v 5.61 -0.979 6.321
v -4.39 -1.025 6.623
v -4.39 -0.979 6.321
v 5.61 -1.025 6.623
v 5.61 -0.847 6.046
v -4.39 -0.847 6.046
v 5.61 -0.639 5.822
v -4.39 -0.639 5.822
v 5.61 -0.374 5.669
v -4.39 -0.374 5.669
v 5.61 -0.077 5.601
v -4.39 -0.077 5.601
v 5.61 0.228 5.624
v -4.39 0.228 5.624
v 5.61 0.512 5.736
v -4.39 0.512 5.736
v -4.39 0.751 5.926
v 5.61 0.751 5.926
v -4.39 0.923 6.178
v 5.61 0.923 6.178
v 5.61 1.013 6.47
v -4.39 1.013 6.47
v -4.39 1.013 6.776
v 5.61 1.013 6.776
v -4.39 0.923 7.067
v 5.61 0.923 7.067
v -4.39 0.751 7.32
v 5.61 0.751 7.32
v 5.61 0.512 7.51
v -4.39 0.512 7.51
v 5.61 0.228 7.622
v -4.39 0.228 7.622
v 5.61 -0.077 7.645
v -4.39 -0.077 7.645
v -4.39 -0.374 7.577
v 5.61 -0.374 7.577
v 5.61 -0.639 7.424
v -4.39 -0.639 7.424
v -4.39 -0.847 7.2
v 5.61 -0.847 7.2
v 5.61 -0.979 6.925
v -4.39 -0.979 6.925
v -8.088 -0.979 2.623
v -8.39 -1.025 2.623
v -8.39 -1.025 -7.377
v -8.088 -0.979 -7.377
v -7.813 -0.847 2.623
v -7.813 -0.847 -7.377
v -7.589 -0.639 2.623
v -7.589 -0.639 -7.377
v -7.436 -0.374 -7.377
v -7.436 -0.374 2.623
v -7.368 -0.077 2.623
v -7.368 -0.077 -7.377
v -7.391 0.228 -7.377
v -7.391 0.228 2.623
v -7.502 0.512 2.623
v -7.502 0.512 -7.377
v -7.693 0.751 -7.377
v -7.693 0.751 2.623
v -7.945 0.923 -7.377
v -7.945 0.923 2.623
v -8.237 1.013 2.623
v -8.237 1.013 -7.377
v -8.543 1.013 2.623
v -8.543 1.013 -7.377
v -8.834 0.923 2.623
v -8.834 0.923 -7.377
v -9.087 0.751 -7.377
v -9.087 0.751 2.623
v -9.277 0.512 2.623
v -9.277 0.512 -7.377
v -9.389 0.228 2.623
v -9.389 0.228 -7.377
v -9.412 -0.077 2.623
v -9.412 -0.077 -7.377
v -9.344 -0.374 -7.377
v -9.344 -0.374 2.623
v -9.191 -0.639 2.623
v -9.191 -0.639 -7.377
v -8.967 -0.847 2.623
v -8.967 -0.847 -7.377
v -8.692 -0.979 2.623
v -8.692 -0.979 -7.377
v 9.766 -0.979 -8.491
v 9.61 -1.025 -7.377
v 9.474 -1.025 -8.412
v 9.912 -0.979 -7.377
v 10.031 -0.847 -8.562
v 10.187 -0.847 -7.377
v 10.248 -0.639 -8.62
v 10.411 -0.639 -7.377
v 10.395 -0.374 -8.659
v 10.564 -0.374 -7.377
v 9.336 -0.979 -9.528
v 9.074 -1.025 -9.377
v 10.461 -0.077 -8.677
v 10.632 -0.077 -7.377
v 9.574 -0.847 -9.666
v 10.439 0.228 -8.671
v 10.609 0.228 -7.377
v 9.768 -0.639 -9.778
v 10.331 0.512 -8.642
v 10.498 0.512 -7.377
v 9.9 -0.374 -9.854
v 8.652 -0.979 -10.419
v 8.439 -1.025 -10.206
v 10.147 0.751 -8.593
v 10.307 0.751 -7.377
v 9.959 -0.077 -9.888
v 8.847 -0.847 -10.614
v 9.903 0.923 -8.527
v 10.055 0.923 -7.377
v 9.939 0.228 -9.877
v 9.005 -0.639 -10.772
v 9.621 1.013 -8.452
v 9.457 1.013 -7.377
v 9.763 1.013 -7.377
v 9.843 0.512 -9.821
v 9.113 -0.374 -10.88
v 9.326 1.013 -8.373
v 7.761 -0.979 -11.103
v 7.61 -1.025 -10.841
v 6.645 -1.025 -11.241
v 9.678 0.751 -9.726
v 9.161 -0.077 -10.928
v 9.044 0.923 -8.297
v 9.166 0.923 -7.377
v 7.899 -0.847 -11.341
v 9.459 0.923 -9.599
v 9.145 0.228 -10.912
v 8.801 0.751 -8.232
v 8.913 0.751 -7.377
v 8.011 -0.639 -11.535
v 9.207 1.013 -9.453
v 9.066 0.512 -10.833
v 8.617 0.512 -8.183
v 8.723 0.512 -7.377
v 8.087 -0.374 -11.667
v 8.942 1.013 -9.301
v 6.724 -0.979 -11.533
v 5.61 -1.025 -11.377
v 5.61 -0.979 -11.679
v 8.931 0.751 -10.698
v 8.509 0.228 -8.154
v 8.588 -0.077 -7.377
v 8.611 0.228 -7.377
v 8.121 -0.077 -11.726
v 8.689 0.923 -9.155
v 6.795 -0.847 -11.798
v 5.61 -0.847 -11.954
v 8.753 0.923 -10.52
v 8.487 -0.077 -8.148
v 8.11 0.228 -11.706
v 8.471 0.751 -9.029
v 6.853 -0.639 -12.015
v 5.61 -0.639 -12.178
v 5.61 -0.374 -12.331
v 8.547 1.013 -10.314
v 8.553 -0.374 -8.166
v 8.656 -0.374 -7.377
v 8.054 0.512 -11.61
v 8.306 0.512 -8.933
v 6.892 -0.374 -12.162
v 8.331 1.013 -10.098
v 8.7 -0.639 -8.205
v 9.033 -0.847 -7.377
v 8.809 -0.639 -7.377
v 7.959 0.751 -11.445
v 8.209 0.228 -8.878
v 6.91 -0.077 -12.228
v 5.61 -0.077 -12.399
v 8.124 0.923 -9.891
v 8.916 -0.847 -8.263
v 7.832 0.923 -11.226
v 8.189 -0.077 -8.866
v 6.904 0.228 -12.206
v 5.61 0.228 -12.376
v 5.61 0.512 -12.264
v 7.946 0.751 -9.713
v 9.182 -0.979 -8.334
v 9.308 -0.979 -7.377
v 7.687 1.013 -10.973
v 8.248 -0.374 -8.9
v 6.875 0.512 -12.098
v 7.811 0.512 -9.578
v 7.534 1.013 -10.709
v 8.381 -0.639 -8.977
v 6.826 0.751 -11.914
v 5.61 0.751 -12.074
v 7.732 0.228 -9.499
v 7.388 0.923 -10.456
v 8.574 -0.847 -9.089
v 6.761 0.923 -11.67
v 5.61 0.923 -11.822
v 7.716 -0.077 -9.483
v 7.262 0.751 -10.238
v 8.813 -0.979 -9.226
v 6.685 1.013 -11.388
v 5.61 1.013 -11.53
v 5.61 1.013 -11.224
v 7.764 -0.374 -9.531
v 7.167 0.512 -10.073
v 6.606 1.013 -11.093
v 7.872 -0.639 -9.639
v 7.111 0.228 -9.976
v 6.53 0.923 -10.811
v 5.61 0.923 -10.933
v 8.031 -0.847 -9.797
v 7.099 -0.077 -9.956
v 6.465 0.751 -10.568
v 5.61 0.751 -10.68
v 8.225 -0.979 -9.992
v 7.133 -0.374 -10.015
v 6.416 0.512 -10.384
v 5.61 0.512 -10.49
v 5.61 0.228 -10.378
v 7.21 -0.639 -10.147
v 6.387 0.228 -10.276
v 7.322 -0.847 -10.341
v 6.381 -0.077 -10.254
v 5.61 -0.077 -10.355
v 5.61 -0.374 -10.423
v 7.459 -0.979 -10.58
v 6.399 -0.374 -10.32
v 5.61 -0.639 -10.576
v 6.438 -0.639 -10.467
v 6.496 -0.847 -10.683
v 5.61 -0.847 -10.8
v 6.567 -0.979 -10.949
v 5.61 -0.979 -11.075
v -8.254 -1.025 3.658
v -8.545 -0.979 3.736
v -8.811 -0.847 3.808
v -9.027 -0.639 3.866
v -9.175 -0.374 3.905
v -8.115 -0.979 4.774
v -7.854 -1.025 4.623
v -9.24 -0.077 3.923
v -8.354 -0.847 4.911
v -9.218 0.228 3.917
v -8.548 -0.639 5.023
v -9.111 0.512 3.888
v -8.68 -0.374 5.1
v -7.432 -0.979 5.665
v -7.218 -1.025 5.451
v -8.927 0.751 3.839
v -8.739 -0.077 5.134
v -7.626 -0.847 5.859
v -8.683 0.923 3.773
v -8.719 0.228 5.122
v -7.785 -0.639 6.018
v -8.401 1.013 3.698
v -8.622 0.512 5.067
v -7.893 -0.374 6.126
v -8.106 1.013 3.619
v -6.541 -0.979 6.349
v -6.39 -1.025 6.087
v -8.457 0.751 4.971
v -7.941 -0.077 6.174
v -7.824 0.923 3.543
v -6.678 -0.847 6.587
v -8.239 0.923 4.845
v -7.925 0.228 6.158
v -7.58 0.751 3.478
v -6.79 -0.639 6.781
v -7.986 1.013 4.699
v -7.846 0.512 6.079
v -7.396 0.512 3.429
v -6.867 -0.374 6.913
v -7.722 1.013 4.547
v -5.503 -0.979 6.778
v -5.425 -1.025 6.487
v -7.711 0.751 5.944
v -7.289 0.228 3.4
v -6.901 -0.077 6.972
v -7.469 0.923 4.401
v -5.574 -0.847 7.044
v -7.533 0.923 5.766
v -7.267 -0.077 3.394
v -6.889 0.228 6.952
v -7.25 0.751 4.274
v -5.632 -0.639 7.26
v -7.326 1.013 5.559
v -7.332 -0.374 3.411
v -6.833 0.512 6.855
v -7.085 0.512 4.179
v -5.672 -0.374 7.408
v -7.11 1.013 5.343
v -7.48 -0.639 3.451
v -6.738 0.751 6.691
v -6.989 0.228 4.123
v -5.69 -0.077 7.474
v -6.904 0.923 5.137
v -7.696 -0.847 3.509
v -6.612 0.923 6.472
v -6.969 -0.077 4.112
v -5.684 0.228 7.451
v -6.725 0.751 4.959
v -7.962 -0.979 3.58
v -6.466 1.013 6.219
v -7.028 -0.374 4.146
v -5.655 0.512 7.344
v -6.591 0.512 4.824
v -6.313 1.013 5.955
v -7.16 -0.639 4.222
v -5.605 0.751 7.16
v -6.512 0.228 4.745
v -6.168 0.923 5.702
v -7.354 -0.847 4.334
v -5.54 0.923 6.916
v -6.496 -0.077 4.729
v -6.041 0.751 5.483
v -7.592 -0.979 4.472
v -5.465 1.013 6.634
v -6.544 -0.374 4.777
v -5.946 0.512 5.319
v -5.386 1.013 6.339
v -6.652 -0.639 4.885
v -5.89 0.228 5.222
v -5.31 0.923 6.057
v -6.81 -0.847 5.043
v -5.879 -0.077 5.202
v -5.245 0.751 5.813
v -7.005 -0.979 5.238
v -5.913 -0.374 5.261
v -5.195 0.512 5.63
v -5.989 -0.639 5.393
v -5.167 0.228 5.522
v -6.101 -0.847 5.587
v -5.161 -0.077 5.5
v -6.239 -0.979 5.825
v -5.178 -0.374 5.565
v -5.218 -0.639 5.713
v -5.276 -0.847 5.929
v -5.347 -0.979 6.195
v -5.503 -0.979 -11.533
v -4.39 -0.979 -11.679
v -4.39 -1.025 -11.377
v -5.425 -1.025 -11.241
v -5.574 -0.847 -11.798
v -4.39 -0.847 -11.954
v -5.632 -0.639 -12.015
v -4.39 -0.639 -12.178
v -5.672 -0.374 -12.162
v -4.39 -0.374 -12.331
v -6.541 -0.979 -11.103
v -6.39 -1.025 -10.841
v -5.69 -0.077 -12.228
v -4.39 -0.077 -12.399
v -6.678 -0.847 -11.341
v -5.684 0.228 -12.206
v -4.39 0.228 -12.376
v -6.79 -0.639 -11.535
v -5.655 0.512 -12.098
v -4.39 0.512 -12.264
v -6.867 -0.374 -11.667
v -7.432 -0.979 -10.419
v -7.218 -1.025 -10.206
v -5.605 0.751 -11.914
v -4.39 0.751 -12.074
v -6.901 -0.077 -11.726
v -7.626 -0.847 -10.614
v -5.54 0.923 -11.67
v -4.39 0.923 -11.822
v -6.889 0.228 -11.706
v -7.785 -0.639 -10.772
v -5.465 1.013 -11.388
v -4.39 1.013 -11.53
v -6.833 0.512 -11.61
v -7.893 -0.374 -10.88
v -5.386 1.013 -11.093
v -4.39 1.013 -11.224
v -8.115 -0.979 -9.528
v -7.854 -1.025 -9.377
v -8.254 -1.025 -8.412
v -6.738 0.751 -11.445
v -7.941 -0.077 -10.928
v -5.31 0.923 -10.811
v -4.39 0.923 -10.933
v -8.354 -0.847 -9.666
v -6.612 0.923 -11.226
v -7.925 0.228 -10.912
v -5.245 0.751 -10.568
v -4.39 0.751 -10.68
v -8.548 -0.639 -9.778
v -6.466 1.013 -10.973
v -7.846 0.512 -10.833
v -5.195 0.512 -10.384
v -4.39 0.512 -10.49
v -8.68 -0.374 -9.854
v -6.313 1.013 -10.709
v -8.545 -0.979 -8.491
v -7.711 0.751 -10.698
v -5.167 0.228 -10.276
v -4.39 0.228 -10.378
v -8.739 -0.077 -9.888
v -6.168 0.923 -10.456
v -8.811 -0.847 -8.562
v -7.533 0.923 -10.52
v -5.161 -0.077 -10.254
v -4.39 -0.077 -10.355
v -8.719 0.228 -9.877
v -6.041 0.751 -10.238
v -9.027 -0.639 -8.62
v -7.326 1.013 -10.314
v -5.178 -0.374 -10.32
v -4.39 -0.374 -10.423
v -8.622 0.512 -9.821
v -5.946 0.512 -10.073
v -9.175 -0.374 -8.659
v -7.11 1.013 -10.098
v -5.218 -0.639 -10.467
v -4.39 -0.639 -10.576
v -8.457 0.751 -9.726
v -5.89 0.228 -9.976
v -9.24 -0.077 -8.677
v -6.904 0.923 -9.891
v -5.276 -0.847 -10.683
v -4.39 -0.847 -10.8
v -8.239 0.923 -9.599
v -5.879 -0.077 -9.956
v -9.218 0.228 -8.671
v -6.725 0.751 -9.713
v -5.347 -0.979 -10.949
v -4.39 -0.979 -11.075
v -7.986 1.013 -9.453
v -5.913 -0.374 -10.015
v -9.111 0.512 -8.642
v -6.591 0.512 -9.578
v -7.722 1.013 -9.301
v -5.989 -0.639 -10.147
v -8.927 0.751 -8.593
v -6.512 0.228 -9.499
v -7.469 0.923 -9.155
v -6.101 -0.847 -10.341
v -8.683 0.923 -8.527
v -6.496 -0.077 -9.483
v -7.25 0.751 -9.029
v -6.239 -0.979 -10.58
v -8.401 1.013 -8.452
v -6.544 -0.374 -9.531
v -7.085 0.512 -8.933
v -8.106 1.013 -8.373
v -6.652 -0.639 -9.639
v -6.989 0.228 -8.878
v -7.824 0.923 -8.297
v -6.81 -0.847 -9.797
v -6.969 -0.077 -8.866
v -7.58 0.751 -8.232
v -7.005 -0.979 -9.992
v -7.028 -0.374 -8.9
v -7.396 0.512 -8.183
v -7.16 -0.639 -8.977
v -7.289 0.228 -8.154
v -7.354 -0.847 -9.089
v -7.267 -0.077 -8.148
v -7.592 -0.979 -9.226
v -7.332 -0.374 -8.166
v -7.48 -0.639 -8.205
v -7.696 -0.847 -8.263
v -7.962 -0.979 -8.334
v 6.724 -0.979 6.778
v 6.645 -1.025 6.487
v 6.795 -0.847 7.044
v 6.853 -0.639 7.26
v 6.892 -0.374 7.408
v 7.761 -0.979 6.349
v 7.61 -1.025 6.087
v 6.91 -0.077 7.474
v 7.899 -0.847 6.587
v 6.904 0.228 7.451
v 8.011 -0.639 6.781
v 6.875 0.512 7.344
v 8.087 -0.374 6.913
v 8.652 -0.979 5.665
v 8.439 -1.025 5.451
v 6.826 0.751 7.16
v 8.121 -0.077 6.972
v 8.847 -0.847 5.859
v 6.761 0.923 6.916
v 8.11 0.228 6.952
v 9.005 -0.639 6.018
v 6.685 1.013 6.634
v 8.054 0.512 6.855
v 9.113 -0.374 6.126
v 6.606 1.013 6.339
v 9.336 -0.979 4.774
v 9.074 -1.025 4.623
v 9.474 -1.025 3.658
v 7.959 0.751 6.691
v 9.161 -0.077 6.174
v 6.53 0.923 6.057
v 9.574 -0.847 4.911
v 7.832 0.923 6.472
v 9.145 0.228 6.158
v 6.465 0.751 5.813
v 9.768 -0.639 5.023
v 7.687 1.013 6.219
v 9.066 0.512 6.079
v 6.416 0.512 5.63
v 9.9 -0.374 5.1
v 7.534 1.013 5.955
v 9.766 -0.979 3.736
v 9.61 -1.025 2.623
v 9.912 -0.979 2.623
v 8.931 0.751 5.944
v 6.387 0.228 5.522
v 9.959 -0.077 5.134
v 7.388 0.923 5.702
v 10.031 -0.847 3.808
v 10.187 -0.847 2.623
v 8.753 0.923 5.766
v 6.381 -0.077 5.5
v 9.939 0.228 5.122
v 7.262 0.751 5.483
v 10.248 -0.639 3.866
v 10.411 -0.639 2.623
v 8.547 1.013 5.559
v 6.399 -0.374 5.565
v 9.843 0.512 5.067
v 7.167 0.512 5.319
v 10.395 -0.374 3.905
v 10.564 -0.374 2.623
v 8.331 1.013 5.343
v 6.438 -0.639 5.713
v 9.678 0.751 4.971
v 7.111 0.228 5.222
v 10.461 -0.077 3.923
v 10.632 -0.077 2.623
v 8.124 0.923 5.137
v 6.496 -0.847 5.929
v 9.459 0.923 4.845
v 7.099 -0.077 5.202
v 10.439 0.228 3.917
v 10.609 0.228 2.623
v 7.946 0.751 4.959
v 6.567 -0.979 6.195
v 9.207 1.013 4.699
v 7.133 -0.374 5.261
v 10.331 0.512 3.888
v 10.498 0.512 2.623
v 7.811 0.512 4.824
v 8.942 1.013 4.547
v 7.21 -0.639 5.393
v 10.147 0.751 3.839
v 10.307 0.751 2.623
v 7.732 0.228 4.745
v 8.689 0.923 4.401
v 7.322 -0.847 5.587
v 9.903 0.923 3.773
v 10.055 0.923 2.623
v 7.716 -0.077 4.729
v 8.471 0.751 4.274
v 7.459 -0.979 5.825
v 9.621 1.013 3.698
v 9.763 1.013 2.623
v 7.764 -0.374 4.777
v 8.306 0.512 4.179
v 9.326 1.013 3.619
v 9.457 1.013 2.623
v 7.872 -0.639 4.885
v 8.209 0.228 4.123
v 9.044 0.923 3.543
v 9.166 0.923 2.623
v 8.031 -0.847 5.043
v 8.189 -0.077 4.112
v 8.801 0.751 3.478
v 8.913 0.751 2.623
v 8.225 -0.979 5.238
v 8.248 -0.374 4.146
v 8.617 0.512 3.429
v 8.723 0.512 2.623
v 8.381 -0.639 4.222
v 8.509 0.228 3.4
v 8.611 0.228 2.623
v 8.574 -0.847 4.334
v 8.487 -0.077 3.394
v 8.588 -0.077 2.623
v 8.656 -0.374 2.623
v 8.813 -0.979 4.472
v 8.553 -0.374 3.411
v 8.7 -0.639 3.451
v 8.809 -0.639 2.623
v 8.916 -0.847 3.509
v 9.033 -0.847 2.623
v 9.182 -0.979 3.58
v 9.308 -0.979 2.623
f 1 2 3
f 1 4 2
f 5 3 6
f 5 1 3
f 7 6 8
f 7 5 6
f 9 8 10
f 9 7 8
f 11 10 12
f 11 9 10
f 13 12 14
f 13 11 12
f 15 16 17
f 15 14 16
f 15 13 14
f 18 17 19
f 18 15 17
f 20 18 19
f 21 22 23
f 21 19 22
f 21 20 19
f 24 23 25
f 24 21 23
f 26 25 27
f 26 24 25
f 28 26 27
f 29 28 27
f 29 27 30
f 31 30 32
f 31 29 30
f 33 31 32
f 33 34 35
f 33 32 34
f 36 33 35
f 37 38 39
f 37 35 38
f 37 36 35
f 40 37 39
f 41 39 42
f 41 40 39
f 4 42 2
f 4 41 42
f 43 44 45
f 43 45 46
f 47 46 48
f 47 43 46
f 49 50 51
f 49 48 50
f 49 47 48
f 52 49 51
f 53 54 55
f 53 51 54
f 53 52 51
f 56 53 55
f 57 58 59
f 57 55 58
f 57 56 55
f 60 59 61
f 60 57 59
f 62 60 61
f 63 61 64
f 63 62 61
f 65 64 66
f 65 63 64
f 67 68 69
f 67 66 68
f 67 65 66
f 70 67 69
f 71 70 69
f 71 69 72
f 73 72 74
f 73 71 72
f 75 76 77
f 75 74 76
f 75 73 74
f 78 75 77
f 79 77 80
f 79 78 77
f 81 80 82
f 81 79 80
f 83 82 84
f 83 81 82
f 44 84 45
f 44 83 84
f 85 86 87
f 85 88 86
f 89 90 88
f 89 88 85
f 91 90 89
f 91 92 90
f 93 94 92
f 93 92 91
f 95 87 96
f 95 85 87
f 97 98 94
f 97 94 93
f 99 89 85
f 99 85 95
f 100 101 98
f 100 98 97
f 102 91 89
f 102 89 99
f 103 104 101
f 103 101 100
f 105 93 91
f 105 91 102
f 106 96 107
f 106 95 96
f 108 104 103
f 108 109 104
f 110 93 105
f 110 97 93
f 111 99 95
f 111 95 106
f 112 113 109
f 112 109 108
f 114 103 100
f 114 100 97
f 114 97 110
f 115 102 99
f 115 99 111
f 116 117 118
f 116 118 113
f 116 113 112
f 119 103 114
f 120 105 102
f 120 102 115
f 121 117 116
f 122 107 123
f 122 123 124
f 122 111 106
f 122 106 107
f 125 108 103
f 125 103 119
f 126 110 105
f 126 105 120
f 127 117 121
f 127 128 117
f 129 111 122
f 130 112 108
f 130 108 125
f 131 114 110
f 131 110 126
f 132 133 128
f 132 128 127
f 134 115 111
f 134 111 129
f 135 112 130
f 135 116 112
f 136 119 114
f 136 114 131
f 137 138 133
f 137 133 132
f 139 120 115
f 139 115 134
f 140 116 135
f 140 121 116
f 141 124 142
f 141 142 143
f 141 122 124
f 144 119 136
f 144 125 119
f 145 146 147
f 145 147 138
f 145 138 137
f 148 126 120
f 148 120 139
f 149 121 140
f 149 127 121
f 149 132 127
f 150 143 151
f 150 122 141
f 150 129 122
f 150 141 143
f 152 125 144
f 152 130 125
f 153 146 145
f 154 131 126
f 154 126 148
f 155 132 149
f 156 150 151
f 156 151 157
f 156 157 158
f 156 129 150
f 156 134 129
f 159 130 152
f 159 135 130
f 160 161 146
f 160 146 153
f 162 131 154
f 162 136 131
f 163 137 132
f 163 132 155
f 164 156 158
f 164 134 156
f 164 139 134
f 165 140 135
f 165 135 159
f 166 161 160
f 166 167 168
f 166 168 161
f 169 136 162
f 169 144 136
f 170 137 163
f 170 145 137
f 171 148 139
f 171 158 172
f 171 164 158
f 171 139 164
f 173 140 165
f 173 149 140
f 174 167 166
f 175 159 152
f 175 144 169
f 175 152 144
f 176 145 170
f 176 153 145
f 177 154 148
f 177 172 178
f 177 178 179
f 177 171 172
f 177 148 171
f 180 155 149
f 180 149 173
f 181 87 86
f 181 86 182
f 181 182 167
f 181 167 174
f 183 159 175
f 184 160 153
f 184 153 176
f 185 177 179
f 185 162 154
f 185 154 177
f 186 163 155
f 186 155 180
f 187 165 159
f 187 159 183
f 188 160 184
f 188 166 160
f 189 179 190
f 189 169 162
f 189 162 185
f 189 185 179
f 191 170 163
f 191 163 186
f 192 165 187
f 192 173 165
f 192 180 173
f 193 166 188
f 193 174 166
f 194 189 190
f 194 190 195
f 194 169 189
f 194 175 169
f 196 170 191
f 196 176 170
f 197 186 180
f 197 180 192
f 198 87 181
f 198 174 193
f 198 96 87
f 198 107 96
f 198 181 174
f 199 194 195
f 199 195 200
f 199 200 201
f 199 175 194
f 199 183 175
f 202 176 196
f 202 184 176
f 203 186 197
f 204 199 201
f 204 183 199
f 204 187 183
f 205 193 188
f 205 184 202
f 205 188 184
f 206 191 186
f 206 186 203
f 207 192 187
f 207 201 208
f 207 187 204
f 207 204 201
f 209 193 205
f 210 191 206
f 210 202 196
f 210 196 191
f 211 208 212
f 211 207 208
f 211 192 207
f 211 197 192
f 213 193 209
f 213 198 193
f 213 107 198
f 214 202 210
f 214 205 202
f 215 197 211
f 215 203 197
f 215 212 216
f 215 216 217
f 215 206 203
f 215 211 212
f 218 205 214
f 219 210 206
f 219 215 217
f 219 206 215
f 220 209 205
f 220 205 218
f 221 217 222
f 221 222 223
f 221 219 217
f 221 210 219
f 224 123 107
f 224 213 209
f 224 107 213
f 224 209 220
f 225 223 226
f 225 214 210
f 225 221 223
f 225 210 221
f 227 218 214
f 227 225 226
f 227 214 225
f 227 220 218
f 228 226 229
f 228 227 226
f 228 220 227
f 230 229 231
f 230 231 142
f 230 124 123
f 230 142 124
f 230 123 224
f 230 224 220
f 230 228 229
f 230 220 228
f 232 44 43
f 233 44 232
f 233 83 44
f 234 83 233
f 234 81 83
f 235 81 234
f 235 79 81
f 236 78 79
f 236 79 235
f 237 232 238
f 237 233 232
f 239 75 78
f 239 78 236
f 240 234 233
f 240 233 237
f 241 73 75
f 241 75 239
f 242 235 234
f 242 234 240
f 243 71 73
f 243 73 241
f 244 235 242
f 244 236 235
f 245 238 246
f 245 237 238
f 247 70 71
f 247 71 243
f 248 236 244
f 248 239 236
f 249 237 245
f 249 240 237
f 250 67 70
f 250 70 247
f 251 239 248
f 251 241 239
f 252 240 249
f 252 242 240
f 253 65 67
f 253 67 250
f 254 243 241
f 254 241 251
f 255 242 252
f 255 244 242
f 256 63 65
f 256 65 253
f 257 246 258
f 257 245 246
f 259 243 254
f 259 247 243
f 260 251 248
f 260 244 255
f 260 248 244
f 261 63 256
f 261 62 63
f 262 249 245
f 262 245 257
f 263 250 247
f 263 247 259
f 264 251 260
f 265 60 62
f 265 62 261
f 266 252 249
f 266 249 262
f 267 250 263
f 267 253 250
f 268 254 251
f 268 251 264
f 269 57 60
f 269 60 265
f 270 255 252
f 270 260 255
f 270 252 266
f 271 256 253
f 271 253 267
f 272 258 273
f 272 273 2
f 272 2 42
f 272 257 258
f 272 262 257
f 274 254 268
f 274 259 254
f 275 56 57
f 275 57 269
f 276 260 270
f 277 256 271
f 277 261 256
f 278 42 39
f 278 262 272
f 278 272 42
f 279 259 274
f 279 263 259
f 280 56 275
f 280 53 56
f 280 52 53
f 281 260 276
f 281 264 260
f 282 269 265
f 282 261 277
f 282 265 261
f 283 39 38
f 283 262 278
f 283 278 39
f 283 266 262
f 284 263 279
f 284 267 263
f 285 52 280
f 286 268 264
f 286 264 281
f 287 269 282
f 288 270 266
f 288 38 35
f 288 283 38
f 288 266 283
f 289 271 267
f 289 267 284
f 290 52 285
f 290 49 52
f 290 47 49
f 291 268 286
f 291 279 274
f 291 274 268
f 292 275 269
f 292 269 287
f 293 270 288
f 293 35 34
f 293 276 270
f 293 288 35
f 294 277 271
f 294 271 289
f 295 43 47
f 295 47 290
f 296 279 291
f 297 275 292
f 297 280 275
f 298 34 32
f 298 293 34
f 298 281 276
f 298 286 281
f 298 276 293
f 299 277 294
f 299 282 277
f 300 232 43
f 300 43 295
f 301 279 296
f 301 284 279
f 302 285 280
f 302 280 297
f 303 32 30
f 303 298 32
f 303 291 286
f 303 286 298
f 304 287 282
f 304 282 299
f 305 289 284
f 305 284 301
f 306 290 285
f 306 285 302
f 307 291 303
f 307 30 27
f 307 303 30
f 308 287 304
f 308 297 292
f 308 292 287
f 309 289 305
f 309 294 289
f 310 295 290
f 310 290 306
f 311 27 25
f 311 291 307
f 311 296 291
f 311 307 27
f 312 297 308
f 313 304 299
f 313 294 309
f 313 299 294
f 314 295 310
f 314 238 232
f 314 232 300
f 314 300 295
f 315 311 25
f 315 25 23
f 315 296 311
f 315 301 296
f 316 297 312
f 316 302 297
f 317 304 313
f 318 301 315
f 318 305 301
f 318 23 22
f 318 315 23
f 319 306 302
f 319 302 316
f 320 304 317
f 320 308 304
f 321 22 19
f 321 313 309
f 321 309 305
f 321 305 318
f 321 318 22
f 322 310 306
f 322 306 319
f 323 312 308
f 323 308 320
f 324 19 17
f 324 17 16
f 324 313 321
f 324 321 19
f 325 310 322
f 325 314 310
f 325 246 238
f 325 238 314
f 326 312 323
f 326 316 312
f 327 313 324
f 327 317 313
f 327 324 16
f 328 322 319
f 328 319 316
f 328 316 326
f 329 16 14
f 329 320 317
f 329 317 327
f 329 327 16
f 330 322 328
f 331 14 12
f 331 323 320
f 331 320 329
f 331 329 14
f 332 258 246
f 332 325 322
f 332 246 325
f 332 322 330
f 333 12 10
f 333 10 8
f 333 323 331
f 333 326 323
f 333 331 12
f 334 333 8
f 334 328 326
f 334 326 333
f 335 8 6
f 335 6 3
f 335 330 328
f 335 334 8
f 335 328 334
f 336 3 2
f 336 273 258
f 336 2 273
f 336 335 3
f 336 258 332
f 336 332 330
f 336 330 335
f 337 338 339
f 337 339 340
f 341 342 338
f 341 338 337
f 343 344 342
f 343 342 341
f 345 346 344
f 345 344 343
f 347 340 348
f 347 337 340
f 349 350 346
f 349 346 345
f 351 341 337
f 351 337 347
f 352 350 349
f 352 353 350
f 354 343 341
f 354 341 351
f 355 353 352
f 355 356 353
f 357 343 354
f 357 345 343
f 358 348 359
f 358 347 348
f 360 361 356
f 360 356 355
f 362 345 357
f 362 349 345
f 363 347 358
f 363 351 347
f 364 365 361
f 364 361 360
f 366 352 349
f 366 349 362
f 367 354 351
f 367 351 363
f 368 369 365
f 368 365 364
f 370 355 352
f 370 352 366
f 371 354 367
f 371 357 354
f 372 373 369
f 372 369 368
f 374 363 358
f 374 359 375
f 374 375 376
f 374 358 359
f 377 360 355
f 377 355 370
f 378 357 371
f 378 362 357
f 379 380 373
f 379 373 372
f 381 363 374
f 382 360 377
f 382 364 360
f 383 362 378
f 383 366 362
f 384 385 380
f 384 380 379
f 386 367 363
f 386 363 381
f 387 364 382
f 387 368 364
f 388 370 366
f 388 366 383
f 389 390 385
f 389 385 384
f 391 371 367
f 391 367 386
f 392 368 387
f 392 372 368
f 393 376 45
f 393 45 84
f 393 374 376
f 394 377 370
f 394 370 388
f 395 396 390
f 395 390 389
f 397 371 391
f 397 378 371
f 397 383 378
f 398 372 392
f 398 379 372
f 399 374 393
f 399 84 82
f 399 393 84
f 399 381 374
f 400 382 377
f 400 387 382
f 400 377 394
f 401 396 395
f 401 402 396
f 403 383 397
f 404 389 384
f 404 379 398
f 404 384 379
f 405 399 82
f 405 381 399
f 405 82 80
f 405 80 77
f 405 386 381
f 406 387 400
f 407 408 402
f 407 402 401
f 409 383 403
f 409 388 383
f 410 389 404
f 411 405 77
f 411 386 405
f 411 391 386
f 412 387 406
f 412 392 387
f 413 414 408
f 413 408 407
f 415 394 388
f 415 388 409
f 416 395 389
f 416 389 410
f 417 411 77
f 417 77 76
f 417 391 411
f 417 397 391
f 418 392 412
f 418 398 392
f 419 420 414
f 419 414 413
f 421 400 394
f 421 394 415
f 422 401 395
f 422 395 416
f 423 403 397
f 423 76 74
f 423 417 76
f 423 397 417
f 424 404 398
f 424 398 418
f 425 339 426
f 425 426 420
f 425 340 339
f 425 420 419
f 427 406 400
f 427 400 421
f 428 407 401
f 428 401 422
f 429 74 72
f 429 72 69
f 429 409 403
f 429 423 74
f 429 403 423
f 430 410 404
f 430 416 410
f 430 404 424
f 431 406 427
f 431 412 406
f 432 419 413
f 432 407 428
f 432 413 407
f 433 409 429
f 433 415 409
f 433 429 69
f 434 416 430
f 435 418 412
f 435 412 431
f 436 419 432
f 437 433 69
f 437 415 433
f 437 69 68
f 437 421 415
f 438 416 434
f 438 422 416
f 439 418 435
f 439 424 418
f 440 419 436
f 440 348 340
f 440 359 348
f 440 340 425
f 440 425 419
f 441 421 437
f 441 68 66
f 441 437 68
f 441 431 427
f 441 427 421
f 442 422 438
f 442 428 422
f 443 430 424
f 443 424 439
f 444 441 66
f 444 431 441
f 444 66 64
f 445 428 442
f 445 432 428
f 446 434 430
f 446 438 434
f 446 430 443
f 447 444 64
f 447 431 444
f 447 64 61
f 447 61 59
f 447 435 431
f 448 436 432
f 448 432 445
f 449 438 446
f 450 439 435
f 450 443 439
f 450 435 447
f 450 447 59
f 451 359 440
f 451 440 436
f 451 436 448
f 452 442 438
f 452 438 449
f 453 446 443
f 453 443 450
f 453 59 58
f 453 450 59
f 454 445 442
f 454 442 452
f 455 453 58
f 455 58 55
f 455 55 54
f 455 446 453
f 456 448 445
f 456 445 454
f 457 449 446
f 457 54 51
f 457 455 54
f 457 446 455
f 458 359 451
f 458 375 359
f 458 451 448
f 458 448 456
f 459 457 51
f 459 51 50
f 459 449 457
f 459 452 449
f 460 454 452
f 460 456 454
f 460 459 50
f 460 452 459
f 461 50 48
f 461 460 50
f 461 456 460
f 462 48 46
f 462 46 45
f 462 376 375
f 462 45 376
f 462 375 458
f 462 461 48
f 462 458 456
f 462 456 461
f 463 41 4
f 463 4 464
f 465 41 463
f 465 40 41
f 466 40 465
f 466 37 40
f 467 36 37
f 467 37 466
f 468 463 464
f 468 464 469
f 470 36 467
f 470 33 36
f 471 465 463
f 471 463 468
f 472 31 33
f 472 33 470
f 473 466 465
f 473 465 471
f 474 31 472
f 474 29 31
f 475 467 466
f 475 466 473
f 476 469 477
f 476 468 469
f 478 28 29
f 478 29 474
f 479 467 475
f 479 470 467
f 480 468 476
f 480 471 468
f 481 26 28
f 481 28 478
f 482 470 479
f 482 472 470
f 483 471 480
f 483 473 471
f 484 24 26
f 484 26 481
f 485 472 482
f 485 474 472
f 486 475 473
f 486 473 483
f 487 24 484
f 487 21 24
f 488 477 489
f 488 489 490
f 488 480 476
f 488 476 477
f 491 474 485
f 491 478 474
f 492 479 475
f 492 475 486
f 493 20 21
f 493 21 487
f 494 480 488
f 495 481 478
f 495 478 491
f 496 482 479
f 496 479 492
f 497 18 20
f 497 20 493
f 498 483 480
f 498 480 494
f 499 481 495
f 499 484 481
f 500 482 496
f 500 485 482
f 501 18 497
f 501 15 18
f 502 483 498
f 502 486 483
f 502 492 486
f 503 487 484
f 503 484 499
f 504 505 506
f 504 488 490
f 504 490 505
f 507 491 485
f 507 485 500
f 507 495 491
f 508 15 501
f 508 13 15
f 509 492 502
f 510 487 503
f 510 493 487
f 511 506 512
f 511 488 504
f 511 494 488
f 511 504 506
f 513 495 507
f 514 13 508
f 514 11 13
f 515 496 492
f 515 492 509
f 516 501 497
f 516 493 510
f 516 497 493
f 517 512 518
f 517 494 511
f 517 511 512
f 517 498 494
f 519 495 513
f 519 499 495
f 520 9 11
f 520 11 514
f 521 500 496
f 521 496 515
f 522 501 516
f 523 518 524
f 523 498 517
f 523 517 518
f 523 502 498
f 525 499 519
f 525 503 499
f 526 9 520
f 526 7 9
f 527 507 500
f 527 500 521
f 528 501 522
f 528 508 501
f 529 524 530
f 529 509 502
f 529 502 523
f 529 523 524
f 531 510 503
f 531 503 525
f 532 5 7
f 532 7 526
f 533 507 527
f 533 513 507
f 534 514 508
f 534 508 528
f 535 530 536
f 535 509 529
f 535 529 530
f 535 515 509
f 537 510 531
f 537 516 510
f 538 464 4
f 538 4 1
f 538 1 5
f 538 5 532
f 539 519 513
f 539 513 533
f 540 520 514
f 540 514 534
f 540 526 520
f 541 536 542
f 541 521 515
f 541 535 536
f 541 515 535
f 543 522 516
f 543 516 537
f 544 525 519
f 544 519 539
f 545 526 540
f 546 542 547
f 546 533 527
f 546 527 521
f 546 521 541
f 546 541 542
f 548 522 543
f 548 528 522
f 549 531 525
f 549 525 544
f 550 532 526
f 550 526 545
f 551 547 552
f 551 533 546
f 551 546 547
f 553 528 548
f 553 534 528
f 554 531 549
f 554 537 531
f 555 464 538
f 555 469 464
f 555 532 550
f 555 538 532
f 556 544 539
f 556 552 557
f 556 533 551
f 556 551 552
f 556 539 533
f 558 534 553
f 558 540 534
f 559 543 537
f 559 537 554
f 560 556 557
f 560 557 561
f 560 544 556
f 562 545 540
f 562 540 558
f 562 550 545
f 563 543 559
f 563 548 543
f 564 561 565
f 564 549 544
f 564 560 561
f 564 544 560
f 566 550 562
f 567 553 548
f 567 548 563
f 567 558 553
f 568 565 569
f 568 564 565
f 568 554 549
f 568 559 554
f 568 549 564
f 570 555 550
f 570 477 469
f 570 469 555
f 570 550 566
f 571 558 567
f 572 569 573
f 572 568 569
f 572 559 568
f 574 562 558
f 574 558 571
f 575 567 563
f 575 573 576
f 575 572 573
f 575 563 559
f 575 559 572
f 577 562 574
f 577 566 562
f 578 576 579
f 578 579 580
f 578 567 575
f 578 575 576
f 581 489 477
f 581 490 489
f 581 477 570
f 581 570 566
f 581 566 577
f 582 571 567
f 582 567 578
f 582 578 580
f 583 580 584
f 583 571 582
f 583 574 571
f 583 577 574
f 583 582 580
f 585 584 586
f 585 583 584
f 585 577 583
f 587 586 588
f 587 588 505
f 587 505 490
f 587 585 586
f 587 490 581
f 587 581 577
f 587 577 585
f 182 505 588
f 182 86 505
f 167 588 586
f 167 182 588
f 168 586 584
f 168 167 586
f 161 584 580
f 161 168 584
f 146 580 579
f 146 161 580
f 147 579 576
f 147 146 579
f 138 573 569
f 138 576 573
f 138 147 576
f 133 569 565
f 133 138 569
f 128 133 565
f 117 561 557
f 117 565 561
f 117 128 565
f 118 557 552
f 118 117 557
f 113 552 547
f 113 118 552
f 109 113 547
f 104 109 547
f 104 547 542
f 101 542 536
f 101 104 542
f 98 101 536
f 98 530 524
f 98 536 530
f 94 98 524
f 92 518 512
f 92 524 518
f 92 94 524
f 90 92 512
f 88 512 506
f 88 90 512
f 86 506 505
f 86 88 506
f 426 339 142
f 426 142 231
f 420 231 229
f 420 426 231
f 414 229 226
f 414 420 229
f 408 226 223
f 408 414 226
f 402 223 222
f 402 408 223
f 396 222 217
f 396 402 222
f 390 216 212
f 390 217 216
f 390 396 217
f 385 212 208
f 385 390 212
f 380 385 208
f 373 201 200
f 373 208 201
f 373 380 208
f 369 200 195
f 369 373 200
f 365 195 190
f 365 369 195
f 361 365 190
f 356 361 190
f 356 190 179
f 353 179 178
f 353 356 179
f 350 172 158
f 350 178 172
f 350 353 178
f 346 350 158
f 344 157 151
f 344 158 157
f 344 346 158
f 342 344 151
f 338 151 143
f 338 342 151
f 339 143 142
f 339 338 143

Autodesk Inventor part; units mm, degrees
ref_plane "YZ Plane" through (0, 0, 0) normal (1, 0, 0) x (0, 1, 0)
ref_plane "XZ Plane" through (0, 0, 0) normal (0, 1, 0) x (-1, 0, 0)
ref_plane "XY Plane" through (0, 0, 0) normal (0, 0, 1) x (1, 0, 0)
sketch "Эскиз1" plane through (0, 0, 0) normal (0, 1, 0) x (-1, 0, 0)
  line L0 (4.3898, 6.6229) -> (-5.6102, 6.6229)
  line L1 (-9.6102, 2.6229) -> (-9.6102, -7.3771)
  line L2 (-5.6102, -11.3771) -> (4.3898, -11.3771)
  line L3 (8.3898, -7.3771) -> (8.3898, 2.6229)
  arc A0 (8.3898, 2.6229) -> (4.3898, 6.6229) centre (4.3898, 2.6229) ccw
  arc A1 (4.3898, -11.3771) -> (8.3898, -7.3771) centre (4.3898, -7.3771) ccw
  arc A2 (-9.6102, -7.3771) -> (-5.6102, -11.3771) centre (-5.6102, -7.3771) ccw
  arc A3 (-5.6102, 6.6229) -> (-9.6102, 2.6229) centre (-5.6102, 2.6229) ccw
  point P0 (0, 0)
  point P1 (-9.6102, -11.3771)
  point P2 (-9.6102, 6.6229)
  point P3 (8.3898, -11.3771)
  point P4 (0, -11.3771)
  dimension "d0" = 18
  dimension "d1" = 18
  dimension "d2" = 4
sketch "Эскиз2" plane through (0, 0, 0) normal (0, 1, 0) x (-1, 0, 0)
  point P0 (0, 0)
ref_plane "РабПлоскость1" through (0, 0, -11.3771) normal (-1, 0, 0) x (0, -1, 0)
sketch "Эскиз3" plane through (0, 0, -11.3771) normal (-1, 0, 0) x (0, -1, 0)
  circle A0 centre (0, 0) radius 1.0246
  point P0 (0, 11.3771)
sweep "Сдвиг1" add profiles "Эскиз3" path "Эскиз1"
properties part number "Деталь 8 лаба"
